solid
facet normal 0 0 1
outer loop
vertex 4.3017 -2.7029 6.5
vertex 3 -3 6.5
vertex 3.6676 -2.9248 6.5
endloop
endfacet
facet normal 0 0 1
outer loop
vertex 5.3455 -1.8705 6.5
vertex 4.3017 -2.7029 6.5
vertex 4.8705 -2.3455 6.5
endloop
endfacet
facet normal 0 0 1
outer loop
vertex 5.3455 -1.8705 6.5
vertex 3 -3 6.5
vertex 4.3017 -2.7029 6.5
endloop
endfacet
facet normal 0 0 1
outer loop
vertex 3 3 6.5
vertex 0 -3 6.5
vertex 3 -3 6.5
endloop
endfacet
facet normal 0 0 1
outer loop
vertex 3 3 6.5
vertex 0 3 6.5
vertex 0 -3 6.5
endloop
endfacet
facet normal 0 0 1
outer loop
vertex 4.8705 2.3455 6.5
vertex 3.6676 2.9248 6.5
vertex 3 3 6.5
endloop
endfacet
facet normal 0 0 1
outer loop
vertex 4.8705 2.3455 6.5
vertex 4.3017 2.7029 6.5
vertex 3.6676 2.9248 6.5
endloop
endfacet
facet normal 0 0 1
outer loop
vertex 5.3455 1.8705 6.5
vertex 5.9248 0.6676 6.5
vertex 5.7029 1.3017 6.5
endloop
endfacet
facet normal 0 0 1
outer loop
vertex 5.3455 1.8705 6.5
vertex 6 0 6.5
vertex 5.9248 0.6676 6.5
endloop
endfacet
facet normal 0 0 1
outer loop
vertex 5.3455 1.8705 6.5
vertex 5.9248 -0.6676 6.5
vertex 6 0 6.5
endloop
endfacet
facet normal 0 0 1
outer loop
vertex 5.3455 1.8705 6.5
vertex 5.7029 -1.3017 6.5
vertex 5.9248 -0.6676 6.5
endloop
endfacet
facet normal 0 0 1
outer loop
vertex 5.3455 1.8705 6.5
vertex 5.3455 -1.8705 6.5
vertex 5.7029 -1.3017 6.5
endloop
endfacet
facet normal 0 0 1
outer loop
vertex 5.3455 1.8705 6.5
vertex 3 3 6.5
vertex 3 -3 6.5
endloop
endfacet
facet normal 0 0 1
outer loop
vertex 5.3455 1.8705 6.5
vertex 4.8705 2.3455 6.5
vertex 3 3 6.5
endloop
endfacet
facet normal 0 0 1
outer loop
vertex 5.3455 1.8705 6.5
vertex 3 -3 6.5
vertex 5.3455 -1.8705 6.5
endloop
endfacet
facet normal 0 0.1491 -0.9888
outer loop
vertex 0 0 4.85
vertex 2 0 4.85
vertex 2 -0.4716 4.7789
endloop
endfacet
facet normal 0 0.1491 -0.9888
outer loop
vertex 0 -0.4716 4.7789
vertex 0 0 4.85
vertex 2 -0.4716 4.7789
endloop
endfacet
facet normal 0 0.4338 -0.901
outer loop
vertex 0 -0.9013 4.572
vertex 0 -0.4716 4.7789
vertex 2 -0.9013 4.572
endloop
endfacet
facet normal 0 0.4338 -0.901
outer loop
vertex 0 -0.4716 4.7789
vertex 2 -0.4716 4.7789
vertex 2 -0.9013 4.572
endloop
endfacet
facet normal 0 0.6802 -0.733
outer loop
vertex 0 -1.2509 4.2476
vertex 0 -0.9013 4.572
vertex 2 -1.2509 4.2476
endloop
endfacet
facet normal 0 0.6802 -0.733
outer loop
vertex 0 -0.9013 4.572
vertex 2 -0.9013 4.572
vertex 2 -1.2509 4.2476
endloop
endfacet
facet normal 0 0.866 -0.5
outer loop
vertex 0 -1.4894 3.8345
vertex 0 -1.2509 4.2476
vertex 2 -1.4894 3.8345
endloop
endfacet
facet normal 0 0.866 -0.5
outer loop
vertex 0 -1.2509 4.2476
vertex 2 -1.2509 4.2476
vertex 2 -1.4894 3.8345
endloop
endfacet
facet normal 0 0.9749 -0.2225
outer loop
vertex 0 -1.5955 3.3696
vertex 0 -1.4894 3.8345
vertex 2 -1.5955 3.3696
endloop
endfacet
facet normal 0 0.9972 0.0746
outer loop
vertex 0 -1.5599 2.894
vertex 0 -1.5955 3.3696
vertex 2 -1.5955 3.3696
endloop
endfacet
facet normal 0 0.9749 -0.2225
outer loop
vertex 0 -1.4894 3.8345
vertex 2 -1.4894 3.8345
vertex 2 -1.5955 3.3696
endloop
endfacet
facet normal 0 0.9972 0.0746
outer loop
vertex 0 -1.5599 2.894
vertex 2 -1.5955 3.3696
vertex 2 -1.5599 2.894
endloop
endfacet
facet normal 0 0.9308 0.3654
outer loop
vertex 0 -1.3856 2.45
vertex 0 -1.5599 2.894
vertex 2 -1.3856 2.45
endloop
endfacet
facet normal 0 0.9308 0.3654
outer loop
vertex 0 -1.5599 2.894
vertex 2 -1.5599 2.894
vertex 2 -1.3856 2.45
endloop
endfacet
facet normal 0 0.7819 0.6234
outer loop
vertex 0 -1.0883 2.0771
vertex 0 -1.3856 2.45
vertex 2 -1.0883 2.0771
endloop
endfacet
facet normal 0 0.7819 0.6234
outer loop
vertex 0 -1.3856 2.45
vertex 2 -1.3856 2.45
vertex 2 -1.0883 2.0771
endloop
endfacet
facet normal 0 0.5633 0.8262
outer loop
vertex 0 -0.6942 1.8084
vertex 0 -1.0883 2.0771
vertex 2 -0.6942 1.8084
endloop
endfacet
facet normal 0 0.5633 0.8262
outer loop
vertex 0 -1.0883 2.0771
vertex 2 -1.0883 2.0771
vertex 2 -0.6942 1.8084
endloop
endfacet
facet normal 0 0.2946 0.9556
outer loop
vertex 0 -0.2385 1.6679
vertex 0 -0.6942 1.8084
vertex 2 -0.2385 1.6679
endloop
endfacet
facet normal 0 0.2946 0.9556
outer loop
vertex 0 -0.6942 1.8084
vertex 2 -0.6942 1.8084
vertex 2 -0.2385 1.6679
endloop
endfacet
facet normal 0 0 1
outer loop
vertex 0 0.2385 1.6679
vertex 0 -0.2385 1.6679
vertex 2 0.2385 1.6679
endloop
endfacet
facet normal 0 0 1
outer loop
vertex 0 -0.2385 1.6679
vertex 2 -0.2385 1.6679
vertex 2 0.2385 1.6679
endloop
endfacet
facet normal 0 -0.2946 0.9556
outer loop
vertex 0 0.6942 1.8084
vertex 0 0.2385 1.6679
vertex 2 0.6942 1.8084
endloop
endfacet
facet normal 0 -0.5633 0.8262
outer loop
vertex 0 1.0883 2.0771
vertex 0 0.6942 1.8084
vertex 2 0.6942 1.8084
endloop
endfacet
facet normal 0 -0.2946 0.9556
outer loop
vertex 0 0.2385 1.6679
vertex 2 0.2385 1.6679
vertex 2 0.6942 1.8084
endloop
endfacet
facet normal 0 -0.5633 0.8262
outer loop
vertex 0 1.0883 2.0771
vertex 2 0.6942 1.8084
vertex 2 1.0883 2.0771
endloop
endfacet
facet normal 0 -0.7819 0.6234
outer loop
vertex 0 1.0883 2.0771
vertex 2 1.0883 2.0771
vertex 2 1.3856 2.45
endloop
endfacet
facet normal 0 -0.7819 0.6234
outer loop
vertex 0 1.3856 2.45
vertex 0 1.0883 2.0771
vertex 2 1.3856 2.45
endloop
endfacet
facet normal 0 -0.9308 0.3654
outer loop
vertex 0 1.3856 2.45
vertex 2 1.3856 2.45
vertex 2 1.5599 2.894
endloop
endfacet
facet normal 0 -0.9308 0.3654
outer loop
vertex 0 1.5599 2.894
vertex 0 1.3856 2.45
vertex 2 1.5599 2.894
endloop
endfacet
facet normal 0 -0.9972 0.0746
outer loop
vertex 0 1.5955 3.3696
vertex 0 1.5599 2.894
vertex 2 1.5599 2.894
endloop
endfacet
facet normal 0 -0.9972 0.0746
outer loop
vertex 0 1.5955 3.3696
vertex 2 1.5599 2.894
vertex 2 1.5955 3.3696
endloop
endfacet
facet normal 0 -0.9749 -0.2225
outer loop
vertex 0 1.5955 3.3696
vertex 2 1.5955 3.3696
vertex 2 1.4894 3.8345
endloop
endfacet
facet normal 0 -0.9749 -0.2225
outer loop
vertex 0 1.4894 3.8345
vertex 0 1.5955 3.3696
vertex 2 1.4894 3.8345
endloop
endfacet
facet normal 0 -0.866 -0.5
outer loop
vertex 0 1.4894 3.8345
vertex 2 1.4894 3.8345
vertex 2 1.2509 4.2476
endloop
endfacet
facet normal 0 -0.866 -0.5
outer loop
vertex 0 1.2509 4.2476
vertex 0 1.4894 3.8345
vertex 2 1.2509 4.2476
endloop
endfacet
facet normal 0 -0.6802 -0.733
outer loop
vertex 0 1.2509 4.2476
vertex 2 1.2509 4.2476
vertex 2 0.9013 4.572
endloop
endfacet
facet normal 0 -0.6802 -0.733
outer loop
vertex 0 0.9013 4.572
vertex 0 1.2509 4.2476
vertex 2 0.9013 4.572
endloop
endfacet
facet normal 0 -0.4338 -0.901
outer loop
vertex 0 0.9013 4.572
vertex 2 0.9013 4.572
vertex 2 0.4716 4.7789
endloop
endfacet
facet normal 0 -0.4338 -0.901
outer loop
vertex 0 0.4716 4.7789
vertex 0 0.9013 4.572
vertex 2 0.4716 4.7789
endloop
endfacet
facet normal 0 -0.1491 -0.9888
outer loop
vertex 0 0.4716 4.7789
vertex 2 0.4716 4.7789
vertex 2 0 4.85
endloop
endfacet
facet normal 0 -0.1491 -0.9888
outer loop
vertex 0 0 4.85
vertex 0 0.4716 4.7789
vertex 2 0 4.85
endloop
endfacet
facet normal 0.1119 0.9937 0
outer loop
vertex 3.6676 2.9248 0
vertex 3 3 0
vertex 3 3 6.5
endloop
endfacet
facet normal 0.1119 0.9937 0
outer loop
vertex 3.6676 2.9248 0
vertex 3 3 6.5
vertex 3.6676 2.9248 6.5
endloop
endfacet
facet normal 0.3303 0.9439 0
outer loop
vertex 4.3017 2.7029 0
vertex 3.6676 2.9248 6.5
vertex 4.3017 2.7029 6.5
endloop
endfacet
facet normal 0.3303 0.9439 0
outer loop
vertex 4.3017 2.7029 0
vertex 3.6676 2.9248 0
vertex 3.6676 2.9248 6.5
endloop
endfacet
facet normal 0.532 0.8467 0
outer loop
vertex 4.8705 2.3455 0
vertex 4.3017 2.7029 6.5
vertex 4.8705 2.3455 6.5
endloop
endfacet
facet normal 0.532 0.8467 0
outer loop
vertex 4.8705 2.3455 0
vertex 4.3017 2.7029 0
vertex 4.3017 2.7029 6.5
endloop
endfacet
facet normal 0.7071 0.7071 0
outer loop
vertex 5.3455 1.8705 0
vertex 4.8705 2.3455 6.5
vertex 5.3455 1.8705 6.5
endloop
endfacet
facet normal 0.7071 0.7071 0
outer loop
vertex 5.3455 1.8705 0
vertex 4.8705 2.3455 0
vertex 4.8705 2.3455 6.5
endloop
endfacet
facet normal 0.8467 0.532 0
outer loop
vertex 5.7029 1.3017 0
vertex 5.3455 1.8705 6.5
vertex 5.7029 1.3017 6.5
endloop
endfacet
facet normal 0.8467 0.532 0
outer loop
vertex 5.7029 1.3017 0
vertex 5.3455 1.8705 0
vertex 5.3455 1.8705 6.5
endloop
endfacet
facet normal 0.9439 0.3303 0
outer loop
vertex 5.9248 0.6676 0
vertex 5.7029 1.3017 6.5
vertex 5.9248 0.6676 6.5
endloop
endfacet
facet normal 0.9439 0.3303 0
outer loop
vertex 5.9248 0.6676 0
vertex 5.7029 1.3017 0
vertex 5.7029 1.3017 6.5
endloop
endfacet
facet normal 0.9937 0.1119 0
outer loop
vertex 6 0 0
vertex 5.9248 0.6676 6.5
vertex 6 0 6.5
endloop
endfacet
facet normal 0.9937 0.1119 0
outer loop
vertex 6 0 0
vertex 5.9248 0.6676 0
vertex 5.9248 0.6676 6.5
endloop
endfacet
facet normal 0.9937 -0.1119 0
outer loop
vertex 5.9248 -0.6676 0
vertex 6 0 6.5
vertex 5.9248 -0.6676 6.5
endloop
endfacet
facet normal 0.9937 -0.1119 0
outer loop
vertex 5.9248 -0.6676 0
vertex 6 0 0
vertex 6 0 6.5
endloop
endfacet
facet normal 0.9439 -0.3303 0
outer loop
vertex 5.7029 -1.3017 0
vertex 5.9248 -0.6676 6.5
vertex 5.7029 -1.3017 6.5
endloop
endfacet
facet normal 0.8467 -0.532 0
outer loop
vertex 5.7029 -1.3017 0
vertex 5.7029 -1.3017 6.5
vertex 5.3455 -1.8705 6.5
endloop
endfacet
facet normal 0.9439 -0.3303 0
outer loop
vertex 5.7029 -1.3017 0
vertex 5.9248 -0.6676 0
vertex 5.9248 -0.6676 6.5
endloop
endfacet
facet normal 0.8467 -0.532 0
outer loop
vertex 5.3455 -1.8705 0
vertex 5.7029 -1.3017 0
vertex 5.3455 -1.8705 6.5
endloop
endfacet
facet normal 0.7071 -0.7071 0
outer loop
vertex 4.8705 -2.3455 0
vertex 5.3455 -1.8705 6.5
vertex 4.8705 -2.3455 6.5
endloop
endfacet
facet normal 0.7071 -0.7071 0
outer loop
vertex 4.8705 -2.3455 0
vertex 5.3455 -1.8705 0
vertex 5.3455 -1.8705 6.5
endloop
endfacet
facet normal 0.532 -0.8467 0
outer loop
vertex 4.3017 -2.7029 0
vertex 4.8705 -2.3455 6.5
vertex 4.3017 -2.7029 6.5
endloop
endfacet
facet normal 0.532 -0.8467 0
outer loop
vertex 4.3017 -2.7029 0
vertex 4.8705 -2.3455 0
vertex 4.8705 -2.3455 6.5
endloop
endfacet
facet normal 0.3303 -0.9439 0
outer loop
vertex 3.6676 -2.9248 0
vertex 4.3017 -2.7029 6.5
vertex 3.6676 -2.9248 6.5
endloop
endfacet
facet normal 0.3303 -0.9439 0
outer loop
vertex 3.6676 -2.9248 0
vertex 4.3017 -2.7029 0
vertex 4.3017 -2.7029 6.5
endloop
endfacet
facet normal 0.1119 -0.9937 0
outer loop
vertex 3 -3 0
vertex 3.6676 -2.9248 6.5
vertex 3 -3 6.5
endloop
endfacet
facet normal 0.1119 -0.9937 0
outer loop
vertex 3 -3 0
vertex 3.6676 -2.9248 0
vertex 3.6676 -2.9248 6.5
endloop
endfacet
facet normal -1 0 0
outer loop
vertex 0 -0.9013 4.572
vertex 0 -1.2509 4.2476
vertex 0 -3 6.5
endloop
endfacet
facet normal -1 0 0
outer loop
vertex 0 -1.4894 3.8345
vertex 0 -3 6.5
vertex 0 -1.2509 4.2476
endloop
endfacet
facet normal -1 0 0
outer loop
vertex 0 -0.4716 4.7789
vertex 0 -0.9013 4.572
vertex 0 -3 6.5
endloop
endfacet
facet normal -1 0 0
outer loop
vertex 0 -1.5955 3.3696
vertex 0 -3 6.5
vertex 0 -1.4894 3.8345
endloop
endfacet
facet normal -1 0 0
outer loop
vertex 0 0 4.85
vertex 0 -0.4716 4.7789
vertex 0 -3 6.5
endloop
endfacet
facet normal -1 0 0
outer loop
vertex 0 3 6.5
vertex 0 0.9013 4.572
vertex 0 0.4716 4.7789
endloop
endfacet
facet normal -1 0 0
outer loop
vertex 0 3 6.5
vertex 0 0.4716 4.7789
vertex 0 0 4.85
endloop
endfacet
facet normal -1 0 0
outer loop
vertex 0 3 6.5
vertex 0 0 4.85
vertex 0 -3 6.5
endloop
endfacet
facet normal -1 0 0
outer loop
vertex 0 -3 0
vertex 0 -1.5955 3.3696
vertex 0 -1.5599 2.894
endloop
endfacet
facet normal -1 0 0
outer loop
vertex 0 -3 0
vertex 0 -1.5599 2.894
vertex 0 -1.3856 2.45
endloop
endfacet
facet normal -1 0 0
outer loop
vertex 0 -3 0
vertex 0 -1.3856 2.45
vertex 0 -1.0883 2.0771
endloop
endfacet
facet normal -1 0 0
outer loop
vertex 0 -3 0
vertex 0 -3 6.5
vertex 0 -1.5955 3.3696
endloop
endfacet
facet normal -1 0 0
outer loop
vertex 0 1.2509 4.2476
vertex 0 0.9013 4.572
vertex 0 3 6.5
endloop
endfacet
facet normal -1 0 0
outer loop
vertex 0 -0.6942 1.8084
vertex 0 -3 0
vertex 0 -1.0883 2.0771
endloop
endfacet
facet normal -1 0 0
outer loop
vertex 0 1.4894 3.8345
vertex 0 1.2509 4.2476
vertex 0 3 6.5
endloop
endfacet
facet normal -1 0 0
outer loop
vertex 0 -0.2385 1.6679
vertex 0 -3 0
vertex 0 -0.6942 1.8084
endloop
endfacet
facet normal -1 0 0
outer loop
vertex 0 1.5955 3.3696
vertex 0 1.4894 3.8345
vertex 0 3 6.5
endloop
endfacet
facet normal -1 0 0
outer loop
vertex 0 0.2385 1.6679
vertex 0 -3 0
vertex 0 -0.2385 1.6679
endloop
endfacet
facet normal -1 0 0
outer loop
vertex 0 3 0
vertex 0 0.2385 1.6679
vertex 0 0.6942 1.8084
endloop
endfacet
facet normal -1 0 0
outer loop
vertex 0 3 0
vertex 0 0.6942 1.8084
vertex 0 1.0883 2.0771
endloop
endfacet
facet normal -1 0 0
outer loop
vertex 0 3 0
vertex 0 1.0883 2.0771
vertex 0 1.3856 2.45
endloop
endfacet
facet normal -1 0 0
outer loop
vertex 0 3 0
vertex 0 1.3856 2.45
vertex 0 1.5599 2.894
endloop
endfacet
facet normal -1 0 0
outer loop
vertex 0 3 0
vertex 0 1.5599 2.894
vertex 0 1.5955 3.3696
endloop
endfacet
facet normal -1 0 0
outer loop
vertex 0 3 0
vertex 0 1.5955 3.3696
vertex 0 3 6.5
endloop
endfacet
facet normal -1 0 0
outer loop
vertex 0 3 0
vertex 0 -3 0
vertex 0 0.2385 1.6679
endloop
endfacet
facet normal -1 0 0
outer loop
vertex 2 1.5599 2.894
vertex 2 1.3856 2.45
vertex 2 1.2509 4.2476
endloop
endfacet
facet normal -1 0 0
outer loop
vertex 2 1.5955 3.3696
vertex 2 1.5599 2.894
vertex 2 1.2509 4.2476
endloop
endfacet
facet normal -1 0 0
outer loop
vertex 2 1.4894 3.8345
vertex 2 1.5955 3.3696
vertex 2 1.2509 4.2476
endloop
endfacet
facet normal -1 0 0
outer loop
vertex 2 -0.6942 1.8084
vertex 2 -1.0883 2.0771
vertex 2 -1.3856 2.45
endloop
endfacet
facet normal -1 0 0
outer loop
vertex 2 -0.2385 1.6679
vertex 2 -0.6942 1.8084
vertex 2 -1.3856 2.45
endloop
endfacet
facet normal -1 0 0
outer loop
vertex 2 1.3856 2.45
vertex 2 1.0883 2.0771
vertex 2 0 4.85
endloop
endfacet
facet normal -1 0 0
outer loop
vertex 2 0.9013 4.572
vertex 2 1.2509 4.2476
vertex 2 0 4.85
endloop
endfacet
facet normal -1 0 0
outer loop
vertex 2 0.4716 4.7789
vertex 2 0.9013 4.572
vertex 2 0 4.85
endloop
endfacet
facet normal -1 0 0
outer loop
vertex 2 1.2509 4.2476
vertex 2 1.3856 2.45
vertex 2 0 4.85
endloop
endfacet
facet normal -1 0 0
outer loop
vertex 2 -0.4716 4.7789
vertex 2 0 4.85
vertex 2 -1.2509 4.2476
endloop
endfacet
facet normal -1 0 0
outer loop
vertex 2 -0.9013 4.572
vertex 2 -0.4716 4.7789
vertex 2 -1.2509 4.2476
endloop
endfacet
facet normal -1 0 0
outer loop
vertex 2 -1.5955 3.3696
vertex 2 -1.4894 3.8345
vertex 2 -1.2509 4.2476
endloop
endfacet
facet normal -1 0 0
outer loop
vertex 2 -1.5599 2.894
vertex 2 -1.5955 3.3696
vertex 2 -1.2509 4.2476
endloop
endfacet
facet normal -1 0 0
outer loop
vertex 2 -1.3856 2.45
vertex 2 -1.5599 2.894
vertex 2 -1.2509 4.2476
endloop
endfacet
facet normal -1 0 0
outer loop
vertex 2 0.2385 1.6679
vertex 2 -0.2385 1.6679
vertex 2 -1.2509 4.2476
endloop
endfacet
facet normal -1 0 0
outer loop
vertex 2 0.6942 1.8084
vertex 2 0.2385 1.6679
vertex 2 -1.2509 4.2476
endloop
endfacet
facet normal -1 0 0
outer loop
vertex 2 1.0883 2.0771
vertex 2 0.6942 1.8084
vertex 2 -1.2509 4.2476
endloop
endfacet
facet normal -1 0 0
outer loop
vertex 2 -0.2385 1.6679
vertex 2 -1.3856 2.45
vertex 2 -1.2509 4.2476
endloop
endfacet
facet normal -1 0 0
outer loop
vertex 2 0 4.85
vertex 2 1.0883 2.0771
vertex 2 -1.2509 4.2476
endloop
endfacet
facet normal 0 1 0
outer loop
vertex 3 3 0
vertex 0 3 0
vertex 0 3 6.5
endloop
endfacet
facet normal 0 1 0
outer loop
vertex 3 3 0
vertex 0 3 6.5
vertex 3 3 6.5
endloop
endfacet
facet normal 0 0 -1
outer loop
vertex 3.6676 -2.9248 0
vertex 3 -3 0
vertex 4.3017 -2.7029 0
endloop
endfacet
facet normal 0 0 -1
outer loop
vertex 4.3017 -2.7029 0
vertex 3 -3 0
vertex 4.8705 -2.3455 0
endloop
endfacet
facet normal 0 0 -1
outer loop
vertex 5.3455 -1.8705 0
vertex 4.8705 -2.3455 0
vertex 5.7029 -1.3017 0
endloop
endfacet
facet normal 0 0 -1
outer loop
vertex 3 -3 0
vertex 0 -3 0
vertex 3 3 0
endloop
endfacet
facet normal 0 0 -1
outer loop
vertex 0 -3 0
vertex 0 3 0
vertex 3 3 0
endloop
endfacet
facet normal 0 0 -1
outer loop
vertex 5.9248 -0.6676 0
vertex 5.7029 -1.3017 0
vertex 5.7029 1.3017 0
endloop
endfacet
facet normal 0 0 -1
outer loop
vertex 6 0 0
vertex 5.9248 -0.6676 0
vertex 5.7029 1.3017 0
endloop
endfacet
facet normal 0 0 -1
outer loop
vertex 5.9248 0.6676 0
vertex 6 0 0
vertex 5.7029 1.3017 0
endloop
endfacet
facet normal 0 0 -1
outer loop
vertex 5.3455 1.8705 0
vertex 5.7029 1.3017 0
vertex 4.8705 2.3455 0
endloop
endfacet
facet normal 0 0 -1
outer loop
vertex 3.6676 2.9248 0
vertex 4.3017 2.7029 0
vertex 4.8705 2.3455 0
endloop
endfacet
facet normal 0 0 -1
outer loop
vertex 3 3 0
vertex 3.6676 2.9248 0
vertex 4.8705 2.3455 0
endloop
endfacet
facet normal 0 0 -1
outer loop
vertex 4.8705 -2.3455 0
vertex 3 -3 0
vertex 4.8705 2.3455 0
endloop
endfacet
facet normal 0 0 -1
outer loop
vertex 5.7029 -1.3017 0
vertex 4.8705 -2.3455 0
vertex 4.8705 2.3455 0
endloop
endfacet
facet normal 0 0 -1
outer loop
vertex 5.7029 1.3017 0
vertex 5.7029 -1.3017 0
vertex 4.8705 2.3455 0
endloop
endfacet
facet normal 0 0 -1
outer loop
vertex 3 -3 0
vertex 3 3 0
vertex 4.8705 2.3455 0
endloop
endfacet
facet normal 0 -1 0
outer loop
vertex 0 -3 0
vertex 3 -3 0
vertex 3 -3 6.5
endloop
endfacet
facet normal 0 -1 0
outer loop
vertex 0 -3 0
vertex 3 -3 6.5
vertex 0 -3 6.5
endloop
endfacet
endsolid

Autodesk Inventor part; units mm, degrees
ref_plane "YZ Plane" through (0, 0, 0) normal (1, 0, 0) x (0, 1, 0)
ref_plane "XZ Plane" through (0, 0, 0) normal (0, 1, 0) x (-1, 0, 0)
ref_plane "XY Plane" through (0, 0, 0) normal (0, 0, 1) x (1, 0, 0)
sketch "Sketch1" plane through (0, 0, 0) normal (0, 0, 1) x (1, 0, 0)
  line L0 (0, 3) -> (3, 3)
  line L1 (6, 0) -> (6, 0)
  line L2 (3, -3) -> (0, -3)
  line L3 (0, -3) -> (0, 3)
  arc A0 (6, 0) -> (3, 3) centre (3, 0) ccw
  arc A1 (3, -3) -> (6, 0) centre (3, 0) ccw
  point P0 (0, 0)
  point P1 (0, 0)
  dimension "d0" = 3
  dimension "d1" = 6
  dimension "d2" = 6
extrude "Extrusion1" add sketch "Sketch1" along normal blind 6.5
sketch "Sketch2" plane through (0, -3, 0) normal (-1, 0, 0) x (0, 0, 1)
  line L0 (0, 6) -> (6.5, 6) projected
  line L1 (6.5, 6) -> (6.5, 0) projected
  line L2 (0, 0) -> (6.5, 0) projected
  line L3 (0, 0) -> (0, 6) projected
  line L4 (3.25, 6) -> (3.25, 0) construction
  line L5 (0, 3) -> (6.5, 3) construction
  point P0 (3.25, 3)
hole "Hole1" at (0, 0, 3.25) direction (1, 0, 0) diameter 3.2 depth 2
properties part number "Belt Tensioner" material "PC/ABS Plastic"
